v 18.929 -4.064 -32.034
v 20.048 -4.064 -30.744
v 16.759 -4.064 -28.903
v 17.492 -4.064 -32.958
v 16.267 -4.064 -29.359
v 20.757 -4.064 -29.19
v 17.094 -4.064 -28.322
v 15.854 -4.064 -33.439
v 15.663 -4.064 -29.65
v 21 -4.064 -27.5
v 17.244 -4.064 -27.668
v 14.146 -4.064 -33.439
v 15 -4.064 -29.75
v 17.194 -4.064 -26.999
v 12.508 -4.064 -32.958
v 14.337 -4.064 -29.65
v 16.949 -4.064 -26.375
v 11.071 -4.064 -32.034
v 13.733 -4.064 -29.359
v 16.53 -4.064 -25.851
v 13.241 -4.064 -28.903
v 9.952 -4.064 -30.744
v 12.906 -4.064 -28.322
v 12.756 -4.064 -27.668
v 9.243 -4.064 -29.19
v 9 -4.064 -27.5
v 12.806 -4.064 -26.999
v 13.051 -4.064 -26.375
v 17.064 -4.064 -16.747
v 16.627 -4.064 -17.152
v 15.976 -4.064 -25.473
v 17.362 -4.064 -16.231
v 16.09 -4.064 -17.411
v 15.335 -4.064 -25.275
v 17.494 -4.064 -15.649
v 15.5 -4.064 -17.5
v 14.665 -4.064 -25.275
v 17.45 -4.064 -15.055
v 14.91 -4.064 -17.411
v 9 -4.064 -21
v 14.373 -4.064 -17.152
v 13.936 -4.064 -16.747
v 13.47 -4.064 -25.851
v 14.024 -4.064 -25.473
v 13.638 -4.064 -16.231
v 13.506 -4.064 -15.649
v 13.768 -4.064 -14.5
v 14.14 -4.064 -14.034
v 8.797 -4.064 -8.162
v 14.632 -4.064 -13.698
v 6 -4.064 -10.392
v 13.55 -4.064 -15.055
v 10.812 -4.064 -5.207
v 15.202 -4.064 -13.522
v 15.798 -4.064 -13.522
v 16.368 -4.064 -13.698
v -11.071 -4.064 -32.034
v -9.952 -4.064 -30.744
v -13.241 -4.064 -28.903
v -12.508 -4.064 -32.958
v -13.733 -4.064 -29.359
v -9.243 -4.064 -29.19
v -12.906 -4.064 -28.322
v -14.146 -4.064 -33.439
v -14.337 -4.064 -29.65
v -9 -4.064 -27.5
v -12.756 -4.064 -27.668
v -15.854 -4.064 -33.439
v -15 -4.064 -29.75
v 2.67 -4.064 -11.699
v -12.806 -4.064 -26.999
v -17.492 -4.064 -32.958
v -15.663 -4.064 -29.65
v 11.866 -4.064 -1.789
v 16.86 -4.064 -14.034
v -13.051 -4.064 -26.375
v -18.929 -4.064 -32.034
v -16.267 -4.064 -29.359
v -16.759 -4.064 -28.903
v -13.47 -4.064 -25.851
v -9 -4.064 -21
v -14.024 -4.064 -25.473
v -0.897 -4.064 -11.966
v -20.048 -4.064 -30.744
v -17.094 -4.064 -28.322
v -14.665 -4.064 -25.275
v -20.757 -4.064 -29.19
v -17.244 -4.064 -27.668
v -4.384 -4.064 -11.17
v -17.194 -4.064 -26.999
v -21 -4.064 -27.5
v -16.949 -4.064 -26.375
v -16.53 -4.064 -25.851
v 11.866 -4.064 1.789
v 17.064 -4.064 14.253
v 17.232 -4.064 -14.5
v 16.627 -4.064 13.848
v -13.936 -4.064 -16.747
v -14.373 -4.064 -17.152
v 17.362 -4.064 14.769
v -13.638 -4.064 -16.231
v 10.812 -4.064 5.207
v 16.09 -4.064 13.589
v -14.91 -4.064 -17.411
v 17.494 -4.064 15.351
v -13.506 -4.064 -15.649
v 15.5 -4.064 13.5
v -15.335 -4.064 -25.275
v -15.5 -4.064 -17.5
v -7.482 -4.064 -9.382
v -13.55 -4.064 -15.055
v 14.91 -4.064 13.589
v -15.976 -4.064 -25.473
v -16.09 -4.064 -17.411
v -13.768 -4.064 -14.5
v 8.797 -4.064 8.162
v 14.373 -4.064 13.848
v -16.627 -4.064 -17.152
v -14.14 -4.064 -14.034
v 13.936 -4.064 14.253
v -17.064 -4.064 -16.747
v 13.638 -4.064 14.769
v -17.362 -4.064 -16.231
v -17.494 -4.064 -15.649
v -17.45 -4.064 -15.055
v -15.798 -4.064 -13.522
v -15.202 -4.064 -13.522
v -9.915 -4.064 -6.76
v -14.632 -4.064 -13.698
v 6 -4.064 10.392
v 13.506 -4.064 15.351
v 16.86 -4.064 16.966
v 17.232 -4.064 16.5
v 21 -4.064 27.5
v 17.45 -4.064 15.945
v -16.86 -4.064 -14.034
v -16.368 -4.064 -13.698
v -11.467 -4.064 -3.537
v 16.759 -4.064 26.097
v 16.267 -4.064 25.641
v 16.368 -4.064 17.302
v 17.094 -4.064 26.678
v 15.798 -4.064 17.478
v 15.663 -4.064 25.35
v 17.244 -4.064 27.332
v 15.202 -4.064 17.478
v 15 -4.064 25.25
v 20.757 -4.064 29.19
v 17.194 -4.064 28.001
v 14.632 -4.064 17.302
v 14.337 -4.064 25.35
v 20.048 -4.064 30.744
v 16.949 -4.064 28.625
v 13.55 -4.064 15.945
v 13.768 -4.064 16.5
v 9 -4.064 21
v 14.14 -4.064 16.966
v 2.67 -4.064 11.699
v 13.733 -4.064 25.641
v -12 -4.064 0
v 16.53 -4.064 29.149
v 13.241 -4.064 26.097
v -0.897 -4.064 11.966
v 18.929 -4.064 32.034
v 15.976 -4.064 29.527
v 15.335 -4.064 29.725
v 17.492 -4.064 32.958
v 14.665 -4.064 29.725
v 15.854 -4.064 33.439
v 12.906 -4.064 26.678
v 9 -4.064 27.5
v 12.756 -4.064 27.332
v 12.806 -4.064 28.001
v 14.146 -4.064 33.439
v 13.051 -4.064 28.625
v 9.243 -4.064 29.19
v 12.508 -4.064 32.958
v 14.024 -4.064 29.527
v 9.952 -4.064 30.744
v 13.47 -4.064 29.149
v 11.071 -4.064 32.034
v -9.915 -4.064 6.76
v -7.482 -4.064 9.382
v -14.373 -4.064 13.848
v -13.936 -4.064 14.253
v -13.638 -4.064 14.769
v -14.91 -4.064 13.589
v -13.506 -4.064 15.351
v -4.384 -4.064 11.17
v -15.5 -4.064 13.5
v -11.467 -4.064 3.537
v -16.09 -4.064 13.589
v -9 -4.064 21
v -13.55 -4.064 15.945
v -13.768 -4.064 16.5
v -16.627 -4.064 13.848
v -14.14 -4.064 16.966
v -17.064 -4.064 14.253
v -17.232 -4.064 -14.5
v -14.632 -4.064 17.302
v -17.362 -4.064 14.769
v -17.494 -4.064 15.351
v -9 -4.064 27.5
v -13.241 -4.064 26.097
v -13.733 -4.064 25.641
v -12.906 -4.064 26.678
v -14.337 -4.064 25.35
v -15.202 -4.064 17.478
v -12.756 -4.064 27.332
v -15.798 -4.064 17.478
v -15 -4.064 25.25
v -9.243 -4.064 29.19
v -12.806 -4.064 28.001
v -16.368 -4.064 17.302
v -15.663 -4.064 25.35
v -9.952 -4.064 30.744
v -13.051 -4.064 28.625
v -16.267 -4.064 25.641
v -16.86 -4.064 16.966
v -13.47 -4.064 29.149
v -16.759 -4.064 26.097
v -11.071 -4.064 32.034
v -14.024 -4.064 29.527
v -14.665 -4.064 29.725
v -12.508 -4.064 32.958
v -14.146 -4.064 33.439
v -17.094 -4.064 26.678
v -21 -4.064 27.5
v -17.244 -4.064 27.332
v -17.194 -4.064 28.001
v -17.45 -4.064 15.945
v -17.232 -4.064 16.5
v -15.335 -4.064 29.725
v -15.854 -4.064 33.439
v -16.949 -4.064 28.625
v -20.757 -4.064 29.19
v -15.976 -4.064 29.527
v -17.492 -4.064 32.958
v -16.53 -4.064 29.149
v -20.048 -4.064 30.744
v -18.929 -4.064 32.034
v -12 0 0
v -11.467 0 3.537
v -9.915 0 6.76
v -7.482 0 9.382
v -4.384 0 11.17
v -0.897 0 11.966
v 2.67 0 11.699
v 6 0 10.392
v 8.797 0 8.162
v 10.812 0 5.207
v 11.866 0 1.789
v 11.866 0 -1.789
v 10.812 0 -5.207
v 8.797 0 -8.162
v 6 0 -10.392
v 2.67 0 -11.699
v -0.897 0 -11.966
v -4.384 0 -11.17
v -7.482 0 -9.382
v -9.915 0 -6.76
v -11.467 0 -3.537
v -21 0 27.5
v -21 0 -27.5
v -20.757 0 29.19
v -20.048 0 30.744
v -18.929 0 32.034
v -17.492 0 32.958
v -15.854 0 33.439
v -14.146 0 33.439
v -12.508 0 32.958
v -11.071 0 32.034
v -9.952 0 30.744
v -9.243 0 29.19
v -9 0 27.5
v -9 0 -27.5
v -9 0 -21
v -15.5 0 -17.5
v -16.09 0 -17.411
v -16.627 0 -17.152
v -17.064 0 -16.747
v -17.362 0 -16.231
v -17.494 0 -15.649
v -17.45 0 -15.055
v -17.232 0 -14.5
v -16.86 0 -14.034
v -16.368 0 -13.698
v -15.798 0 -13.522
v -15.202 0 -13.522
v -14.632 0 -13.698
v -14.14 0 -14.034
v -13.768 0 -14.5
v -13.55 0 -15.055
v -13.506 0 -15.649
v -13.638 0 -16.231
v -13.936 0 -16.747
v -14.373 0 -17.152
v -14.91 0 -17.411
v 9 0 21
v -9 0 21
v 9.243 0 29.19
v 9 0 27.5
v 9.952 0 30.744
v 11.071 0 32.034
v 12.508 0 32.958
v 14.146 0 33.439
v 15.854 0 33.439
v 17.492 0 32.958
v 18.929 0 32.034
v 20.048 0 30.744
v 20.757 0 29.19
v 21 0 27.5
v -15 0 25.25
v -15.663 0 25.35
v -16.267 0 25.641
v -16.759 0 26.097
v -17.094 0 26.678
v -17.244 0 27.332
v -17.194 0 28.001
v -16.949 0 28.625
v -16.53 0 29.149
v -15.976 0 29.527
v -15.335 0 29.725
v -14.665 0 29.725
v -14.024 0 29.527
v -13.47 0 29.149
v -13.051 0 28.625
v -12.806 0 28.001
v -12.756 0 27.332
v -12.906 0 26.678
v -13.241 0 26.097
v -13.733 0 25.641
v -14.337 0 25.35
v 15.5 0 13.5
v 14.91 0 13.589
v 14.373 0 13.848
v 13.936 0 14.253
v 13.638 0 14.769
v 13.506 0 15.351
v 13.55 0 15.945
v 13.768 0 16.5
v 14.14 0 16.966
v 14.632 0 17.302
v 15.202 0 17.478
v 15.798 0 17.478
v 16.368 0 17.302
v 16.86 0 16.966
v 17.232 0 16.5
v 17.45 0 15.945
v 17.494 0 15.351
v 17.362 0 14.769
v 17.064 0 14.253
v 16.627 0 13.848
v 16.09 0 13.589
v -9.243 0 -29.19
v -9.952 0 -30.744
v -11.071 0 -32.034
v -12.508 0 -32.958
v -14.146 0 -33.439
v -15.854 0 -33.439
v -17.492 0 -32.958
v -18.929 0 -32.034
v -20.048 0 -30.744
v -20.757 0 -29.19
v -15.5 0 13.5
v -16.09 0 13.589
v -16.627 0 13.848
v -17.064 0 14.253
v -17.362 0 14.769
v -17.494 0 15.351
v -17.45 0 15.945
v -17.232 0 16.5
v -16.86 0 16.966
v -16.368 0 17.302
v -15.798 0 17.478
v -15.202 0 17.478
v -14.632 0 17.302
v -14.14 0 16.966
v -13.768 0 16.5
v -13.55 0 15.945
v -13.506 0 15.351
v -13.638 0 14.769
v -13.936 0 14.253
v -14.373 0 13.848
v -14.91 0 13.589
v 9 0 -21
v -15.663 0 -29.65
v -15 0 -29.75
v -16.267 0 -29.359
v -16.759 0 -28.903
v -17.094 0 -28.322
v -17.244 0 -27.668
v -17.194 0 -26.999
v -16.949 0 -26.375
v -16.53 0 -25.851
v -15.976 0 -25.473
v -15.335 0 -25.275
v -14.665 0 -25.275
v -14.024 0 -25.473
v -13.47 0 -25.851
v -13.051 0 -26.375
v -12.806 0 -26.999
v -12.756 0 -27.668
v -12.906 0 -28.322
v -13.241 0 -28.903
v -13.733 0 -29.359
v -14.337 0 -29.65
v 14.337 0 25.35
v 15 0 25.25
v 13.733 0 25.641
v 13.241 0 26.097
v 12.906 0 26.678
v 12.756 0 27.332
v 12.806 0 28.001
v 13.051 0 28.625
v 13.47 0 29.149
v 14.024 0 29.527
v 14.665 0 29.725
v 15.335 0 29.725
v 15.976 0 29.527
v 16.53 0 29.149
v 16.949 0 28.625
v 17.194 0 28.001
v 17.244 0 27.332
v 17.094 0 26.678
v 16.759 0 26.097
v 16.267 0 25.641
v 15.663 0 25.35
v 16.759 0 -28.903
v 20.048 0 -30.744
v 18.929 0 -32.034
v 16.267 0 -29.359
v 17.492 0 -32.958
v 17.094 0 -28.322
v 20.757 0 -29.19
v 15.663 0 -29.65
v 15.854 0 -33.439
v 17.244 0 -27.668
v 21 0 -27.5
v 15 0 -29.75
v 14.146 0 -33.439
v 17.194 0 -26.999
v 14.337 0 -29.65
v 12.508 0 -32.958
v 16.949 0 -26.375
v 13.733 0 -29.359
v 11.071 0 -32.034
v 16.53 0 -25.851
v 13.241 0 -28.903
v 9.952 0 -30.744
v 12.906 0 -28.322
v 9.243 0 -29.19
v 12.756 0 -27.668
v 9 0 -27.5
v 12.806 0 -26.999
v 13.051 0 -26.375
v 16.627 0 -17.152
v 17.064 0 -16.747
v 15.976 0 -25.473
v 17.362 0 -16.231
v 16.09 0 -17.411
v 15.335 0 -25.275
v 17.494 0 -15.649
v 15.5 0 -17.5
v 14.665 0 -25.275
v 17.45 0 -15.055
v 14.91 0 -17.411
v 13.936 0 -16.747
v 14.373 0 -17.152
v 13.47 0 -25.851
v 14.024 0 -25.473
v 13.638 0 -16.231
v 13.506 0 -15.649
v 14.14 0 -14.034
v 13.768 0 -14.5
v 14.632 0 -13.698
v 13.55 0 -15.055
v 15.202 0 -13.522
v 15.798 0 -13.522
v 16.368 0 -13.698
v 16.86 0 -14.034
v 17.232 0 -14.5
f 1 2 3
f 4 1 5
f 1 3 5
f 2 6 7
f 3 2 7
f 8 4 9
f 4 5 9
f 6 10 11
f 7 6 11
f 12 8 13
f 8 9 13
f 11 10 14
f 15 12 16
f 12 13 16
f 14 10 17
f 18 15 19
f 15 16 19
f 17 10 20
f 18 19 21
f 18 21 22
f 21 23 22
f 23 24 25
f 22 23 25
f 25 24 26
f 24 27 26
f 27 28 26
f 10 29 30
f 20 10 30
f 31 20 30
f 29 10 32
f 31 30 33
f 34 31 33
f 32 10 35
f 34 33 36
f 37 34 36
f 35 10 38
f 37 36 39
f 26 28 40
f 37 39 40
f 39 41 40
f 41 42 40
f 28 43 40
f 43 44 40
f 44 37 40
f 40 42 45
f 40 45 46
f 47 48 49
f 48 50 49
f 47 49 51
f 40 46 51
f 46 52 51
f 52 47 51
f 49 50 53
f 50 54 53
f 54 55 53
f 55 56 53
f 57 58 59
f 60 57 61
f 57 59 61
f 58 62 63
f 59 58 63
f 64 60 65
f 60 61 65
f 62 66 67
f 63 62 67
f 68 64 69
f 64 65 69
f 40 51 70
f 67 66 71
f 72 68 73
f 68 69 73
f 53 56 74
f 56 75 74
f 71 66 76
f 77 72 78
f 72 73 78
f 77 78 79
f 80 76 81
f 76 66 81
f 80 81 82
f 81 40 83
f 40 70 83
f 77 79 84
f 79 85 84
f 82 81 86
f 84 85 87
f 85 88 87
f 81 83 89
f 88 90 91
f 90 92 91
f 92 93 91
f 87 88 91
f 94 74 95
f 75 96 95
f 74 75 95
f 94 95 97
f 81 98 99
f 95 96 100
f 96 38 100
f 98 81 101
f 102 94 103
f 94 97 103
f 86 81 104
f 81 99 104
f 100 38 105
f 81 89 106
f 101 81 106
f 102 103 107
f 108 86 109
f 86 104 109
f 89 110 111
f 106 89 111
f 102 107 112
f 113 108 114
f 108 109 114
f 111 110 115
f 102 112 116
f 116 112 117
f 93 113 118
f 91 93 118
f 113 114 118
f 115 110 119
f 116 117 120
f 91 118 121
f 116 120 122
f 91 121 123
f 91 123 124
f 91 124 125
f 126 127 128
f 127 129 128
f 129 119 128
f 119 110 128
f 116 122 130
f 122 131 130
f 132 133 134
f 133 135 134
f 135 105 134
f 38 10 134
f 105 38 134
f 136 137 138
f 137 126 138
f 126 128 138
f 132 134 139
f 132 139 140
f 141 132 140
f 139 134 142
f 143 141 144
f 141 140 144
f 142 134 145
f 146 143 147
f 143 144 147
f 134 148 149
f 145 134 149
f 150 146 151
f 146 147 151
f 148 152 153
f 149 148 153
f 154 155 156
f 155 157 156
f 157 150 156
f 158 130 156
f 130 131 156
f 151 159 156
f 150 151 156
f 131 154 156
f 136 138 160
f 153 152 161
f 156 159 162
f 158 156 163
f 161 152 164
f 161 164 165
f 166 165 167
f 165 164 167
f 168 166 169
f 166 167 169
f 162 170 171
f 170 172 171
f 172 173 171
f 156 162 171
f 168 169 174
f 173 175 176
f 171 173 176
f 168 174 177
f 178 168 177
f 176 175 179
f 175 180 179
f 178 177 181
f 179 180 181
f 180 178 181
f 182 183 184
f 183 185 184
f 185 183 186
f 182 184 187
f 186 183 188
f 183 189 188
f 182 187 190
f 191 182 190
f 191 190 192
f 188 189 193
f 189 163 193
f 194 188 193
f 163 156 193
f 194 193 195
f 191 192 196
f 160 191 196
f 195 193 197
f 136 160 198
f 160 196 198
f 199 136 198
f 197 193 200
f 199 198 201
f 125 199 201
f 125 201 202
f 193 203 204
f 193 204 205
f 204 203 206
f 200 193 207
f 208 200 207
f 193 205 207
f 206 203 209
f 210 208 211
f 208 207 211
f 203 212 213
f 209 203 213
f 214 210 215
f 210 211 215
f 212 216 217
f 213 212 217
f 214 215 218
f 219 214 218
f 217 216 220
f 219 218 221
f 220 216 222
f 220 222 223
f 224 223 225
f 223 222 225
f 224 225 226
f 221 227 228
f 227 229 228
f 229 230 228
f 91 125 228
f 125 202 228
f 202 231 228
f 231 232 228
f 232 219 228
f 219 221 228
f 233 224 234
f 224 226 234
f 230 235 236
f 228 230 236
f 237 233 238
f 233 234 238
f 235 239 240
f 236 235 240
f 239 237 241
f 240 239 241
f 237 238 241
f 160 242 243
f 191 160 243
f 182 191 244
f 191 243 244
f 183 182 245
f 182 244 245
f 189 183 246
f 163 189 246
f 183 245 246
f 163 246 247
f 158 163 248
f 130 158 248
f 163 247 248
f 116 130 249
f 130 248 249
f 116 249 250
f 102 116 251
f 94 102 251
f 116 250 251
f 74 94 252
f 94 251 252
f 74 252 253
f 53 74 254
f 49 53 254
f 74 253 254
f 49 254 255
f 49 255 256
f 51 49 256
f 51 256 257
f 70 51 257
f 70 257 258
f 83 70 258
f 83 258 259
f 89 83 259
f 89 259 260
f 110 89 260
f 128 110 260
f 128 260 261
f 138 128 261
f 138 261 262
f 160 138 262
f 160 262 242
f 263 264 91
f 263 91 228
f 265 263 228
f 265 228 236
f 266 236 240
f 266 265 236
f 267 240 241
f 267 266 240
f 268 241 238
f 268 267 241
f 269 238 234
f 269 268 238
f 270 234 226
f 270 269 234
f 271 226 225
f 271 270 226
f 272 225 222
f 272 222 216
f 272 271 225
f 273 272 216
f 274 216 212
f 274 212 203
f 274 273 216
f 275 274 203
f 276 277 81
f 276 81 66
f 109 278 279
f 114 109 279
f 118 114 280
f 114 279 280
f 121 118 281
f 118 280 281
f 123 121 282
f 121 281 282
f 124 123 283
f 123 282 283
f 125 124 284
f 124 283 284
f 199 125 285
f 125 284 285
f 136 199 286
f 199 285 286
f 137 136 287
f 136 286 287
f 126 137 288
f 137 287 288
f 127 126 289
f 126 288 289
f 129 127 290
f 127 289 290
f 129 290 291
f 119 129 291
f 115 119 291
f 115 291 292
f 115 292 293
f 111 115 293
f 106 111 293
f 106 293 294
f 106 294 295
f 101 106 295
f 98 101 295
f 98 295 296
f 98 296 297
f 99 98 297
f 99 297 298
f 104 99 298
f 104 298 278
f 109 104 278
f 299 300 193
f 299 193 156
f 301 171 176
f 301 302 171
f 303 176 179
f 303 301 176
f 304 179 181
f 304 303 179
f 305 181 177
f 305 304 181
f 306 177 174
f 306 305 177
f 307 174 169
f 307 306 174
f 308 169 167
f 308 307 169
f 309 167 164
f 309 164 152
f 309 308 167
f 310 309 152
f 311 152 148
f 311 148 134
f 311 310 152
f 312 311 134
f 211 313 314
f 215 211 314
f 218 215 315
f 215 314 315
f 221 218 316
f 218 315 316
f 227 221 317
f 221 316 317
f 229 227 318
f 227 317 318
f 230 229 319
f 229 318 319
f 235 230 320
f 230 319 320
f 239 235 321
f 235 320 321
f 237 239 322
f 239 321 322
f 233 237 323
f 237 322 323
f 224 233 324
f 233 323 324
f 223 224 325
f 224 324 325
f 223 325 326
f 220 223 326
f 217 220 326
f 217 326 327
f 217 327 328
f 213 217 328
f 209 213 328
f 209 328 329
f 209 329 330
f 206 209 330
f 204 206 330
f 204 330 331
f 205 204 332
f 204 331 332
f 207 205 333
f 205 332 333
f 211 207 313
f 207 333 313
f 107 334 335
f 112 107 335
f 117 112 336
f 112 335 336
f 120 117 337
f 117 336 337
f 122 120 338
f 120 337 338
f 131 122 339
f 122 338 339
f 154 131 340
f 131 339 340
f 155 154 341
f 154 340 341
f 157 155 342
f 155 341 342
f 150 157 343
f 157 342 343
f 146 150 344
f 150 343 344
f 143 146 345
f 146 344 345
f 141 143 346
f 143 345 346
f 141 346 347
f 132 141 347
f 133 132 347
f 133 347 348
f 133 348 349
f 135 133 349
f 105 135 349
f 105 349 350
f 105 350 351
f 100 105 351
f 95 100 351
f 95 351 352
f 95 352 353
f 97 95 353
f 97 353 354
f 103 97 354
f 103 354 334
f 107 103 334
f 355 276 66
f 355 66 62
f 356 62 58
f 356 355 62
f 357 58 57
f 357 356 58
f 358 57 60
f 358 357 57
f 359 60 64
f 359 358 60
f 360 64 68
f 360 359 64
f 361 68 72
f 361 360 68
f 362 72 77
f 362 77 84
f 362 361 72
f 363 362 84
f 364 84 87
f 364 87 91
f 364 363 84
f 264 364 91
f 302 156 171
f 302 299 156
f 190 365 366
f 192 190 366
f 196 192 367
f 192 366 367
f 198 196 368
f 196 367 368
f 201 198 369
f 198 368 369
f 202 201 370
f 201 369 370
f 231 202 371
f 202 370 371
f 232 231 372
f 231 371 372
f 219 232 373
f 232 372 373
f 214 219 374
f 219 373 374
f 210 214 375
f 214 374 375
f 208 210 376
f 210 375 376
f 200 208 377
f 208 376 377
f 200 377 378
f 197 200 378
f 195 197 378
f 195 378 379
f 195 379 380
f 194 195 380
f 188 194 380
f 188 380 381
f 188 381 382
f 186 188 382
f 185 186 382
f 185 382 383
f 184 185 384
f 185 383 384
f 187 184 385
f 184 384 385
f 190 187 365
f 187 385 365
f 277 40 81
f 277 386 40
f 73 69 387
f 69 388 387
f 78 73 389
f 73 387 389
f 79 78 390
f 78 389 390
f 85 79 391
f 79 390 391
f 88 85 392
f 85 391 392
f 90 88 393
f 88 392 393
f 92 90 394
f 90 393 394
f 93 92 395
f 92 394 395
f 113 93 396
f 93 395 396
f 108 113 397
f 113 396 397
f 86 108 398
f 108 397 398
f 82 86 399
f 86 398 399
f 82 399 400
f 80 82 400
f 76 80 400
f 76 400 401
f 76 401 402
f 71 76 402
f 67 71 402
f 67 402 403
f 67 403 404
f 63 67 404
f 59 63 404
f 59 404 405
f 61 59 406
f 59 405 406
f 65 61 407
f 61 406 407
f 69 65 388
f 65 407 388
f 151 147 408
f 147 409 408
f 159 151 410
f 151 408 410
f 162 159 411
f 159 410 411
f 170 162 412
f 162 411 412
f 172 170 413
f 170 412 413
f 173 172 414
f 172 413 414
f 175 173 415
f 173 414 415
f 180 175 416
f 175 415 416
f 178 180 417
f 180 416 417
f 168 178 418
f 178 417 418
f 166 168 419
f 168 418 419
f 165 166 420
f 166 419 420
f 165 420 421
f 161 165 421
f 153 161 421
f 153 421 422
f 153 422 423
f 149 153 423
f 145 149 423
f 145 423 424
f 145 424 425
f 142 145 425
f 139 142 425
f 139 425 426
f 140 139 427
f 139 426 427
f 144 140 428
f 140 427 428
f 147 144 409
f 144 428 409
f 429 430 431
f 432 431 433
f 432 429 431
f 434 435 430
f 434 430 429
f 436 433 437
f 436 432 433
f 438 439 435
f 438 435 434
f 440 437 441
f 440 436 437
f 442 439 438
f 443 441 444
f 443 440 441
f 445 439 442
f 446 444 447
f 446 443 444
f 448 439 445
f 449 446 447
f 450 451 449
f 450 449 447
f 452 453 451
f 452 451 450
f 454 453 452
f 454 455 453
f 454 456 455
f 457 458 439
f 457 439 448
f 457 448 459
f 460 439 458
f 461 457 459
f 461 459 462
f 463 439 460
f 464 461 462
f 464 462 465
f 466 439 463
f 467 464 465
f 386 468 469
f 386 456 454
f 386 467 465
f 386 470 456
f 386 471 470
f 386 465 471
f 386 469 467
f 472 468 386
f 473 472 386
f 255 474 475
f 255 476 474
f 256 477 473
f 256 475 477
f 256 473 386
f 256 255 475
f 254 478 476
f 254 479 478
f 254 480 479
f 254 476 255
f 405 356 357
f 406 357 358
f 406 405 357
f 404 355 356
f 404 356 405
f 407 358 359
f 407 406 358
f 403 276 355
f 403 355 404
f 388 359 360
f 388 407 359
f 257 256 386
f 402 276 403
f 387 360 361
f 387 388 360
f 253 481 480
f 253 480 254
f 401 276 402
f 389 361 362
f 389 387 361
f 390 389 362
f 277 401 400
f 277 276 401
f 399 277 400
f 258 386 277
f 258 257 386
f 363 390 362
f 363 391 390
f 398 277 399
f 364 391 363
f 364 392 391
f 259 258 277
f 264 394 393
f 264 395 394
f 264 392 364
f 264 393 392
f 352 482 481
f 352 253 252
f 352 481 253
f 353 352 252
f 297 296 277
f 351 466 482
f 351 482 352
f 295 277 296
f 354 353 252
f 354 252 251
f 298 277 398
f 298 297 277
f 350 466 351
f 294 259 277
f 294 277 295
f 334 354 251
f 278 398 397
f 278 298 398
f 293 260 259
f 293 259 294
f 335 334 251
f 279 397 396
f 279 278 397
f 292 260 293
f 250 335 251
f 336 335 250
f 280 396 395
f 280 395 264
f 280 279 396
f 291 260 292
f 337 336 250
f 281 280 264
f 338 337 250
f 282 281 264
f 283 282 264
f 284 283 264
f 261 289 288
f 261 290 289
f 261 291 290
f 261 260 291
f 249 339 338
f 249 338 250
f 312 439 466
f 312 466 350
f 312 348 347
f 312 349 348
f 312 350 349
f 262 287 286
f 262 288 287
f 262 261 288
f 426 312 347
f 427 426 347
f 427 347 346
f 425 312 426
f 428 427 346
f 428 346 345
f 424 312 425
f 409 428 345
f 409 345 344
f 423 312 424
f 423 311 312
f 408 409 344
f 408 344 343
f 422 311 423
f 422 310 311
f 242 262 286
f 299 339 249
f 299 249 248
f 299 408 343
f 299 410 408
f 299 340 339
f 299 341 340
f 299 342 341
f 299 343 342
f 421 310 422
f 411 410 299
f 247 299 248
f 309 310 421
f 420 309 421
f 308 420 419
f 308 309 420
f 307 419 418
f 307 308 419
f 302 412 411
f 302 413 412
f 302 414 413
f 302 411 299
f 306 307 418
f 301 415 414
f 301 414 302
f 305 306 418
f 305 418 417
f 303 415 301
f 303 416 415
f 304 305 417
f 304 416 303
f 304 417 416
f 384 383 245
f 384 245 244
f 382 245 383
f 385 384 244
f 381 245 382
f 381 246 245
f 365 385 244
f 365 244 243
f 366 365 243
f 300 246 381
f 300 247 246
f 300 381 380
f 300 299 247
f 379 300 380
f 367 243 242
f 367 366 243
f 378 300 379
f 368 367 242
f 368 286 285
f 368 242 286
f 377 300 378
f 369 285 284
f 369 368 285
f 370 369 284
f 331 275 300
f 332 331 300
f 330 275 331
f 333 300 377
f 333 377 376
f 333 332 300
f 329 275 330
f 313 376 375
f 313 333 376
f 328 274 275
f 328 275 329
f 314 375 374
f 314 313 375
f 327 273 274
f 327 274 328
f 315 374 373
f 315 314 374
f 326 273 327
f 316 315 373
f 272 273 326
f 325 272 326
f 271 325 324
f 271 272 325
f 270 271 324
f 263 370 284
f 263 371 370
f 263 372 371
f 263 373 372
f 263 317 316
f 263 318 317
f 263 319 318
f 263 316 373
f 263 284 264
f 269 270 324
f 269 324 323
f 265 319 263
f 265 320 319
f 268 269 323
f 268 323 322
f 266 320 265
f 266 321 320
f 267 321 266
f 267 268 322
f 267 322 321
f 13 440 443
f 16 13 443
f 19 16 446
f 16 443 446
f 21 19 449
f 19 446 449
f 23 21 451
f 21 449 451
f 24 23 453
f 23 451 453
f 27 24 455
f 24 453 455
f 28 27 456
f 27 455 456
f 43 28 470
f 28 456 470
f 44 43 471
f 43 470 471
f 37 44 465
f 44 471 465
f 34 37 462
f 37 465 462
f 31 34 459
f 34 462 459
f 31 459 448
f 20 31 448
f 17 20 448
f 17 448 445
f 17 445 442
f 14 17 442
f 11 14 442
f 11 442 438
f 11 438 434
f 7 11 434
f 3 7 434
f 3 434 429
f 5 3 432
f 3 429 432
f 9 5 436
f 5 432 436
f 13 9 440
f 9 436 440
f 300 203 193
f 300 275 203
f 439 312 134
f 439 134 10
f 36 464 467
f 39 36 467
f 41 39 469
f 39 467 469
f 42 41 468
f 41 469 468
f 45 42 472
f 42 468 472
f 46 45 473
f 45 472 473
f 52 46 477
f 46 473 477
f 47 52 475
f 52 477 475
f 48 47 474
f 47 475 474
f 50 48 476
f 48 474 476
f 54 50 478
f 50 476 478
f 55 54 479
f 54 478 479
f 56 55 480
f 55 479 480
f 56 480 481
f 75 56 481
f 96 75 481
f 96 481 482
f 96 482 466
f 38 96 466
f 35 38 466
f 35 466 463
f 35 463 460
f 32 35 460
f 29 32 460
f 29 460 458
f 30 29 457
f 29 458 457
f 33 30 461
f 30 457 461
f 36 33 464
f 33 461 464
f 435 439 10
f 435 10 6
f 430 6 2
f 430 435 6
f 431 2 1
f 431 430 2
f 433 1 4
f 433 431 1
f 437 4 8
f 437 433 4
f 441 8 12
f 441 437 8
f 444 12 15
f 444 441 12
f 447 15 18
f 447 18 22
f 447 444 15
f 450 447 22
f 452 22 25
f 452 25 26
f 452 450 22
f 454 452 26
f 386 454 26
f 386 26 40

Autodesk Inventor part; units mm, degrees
ref_plane "YZ Plane" through (0, 0, 0) normal (1, 0, 0) x (0, 1, 0)
ref_plane "XZ Plane" through (0, 0, 0) normal (0, 1, 0) x (-1, 0, 0)
ref_plane "XY Plane" through (0, 0, 0) normal (0, 0, 1) x (1, 0, 0)
sketch "Sketch1" plane through (0, 0, 0) normal (0, 1, 0) x (-1, 0, 0)
  arc A0 (9, -27.5) -> (21, -27.5) centre (15, -27.5) ccw
  arc A1 (-9, 27.5) -> (-21, 27.5) centre (-15, 27.5) ccw
  arc A2 (21, 27.5) -> (9, 27.5) centre (15, 27.5) ccw
  arc A3 (-21, -27.5) -> (-9, -27.5) centre (-15, -27.5) ccw
  line L0 (-9, 21) -> (-9, 27.5)
  line L1 (-9, -21) -> (9, -21)
  circle A4 centre (0, 0) radius 12
  line L2 (21, -27.5) -> (21, 27.5)
  line L3 (-21, 27.5) -> (-21, -27.5)
  line L4 (9, 21) -> (-9, 21)
  line L5 (9, -21) -> (9, -27.5)
  line L6 (-9, -27.5) -> (-9, -21)
  line L7 (9, 27.5) -> (9, 21)
extrude "Extrusion1" add sketch "Sketch1" against normal blind 4.064
hole "Hole8" at (-15.5, -4.064, -15.5) direction (0, 1, 0) diameter 4 depth 4.064
hole "Hole7" at (-15.5, -4.064, 15.5) direction (0, 1, 0) diameter 4 depth 4.064
hole "Hole6" at (15.5, -4.064, 15.5) direction (0, 1, 0) diameter 4 depth 4.064
hole "Hole5" at (15.5, -4.064, -15.5) direction (0, 1, 0) diameter 4 depth 4.064
sketch "Sketch5" plane through (0, -4.064, 0) normal (0, -1, 0) x (1, 0, 0)
  point P0 (15.5, -15.5)
hole "Hole4" at (15, -4.064, -27.5) direction (0, 1, 0) diameter 4.5 depth 4.064
sketch "Sketch4" plane through (0, -4.064, 0) normal (0, -1, 0) x (1, 0, 0)
  point P0 (15.5, 15.5)
hole "Hole3" at (15, -4.064, 27.5) direction (0, 1, 0) diameter 4.5 depth 4.064
sketch "Sketch3" plane through (0, -4.064, 0) normal (0, -1, 0) x (1, 0, 0)
  point P0 (-15.5, 15.5)
hole "Hole2" at (-15, -4.064, 27.5) direction (0, 1, 0) diameter 4.5 depth 4.064
sketch "Sketch2" plane through (0, -4.064, 0) normal (0, -1, 0) x (1, 0, 0)
  point P0 (-15.5, -15.5)
hole "Hole1" at (-15, -4.064, -27.5) direction (0, 1, 0) diameter 4.5 depth 4.064
sketch "Sketch6" plane through (0, -4.064, 0) normal (0, -1, 0) x (1, 0, 0)
  point P0 (15, -27.5)
sketch "Sketch7" plane through (0, -4.064, 0) normal (0, -1, 0) x (1, 0, 0)
  point P0 (15, 27.5)
sketch "Sketch8" plane through (0, -4.064, 0) normal (0, -1, 0) x (1, 0, 0)
  point P0 (-15, 27.5)
sketch "Sketch9" plane through (0, -4.064, 0) normal (0, -1, 0) x (1, 0, 0)
  point P0 (-15, -27.5)
properties part number "Piston Motor holder" material "Aluminum 6061"
